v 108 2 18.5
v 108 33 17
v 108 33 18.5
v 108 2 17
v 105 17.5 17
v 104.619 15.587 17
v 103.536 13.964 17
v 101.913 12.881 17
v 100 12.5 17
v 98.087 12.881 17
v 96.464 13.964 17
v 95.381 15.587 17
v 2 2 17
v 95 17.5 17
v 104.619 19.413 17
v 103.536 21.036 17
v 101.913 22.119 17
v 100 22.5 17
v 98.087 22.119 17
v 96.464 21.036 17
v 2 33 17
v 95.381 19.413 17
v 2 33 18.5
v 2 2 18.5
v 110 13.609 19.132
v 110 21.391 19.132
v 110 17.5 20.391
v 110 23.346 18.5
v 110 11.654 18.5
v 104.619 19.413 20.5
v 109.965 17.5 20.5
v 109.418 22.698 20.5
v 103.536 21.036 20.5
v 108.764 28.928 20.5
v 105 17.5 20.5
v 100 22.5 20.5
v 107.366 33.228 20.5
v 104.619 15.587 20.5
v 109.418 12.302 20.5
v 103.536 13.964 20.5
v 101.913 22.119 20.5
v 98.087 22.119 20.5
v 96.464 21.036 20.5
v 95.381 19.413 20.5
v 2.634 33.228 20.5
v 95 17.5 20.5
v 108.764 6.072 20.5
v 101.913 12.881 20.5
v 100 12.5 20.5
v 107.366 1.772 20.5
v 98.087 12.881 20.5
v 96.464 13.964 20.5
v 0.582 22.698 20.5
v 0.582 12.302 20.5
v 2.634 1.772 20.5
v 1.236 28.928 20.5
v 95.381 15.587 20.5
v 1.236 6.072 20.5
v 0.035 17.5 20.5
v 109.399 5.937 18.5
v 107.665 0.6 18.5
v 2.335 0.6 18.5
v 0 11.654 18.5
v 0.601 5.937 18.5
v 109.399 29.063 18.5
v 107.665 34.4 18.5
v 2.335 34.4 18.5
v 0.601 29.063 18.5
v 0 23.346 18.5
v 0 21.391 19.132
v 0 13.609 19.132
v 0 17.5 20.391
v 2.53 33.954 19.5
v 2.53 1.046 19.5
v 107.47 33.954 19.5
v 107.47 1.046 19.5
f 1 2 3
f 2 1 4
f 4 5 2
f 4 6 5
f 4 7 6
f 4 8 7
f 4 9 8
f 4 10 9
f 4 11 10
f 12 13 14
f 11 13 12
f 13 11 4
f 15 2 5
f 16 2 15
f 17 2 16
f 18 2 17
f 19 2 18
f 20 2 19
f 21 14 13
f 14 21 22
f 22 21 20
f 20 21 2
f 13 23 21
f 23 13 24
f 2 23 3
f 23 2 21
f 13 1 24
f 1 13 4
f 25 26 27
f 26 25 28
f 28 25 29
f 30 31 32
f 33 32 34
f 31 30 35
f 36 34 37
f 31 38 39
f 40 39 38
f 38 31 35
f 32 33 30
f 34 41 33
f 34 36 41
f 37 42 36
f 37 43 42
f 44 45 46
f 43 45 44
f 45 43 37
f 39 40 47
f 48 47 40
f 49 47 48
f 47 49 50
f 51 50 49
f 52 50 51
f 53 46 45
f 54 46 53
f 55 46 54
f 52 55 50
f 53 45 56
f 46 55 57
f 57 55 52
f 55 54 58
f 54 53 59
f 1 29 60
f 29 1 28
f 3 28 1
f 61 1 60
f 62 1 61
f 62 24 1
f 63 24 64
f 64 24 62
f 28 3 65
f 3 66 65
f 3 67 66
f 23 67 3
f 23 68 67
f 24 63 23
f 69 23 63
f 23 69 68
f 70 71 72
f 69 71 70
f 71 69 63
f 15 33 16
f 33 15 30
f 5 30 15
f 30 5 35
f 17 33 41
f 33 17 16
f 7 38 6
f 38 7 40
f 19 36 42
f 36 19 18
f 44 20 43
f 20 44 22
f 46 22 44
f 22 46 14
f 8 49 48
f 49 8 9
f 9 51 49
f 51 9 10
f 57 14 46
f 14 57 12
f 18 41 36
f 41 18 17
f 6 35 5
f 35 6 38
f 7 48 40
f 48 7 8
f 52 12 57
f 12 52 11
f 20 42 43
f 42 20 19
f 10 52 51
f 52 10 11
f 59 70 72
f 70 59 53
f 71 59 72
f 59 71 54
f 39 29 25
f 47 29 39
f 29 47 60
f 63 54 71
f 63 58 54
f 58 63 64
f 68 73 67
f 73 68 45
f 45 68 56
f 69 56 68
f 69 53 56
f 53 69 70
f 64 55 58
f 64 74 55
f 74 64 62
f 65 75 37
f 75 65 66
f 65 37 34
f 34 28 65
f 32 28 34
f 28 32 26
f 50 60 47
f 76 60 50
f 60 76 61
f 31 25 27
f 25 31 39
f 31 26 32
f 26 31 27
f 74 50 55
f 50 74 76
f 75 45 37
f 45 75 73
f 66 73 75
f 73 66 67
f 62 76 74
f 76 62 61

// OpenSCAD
length = 110;
width = 35;
height = 15;
prodWidth = 2;
aerial = 5;
innerLength = length - (prodWidth*2);
innerWidth = width - (prodWidth*2);
innerHeight = height - (prodWidth);

module falconer()  {  
   casing_offset = 1; 
    module case() {
        difference() {
            union() {
                
                //main
                //cube([length, width, height], false);  
                
                
                
                // top inner
                translate([prodWidth, prodWidth, prodWidth+height]) {
                    cube([innerLength, innerWidth, 2], false);  
                }  
                // top 
                translate([0, 0, prodWidth+height+1.5]) {
                    cube([length, width, 2], false);  
                }  
                
            }
            
            union() {
                
                // logo
                translate([50, prodWidth+15.5, prodWidth+height+4]) {
                    scale([0.08, 0.08, 0.01]) {
                        //surface(file = "falcon.png", center = true, invert = true);
                    }
                }
                
                // cavity
                translate([prodWidth, prodWidth, prodWidth*2]) {
                    cube([innerLength, innerWidth, innerHeight], false);  
                }  
                
                // usb
                translate([0, prodWidth+15.5, 11]) {
                    cube([10, 15, 9], true);  
                } 
                
                // aerial
                translate([100, prodWidth+15.5, 15]) {
                    cylinder(20, aerial, aerial, true);  
                }      
            }
            
        }
    }
    
    module bevel() {
        difference() {
            union() {
                
               translate([55, prodWidth+15.5, 8]) {
                    sphere(60, true);  
               }
               
            }
            union() {
                translate([55, prodWidth+15.5, 3]) {
                    sphere(58, true);  
                }
            }
        }
    }
    
    module bevel2() {
        difference() {
            union() {
                
               rotate ([90,90,90]) {
                    translate([-10, prodWidth+15.5, 5]) {
                        cylinder(220, 30, 30, true);  
                    }    
                }
               
            }
            union() {
                rotate ([90,90,90]) {
                    translate([-10, prodWidth+15.5, 5]) {
                        cylinder(220, 19, 19, true);  
                    }    
                }
            }
        }
    }
    
    difference() {
        case();
        bevel();
        bevel2();
    }
    
}

falconer();
